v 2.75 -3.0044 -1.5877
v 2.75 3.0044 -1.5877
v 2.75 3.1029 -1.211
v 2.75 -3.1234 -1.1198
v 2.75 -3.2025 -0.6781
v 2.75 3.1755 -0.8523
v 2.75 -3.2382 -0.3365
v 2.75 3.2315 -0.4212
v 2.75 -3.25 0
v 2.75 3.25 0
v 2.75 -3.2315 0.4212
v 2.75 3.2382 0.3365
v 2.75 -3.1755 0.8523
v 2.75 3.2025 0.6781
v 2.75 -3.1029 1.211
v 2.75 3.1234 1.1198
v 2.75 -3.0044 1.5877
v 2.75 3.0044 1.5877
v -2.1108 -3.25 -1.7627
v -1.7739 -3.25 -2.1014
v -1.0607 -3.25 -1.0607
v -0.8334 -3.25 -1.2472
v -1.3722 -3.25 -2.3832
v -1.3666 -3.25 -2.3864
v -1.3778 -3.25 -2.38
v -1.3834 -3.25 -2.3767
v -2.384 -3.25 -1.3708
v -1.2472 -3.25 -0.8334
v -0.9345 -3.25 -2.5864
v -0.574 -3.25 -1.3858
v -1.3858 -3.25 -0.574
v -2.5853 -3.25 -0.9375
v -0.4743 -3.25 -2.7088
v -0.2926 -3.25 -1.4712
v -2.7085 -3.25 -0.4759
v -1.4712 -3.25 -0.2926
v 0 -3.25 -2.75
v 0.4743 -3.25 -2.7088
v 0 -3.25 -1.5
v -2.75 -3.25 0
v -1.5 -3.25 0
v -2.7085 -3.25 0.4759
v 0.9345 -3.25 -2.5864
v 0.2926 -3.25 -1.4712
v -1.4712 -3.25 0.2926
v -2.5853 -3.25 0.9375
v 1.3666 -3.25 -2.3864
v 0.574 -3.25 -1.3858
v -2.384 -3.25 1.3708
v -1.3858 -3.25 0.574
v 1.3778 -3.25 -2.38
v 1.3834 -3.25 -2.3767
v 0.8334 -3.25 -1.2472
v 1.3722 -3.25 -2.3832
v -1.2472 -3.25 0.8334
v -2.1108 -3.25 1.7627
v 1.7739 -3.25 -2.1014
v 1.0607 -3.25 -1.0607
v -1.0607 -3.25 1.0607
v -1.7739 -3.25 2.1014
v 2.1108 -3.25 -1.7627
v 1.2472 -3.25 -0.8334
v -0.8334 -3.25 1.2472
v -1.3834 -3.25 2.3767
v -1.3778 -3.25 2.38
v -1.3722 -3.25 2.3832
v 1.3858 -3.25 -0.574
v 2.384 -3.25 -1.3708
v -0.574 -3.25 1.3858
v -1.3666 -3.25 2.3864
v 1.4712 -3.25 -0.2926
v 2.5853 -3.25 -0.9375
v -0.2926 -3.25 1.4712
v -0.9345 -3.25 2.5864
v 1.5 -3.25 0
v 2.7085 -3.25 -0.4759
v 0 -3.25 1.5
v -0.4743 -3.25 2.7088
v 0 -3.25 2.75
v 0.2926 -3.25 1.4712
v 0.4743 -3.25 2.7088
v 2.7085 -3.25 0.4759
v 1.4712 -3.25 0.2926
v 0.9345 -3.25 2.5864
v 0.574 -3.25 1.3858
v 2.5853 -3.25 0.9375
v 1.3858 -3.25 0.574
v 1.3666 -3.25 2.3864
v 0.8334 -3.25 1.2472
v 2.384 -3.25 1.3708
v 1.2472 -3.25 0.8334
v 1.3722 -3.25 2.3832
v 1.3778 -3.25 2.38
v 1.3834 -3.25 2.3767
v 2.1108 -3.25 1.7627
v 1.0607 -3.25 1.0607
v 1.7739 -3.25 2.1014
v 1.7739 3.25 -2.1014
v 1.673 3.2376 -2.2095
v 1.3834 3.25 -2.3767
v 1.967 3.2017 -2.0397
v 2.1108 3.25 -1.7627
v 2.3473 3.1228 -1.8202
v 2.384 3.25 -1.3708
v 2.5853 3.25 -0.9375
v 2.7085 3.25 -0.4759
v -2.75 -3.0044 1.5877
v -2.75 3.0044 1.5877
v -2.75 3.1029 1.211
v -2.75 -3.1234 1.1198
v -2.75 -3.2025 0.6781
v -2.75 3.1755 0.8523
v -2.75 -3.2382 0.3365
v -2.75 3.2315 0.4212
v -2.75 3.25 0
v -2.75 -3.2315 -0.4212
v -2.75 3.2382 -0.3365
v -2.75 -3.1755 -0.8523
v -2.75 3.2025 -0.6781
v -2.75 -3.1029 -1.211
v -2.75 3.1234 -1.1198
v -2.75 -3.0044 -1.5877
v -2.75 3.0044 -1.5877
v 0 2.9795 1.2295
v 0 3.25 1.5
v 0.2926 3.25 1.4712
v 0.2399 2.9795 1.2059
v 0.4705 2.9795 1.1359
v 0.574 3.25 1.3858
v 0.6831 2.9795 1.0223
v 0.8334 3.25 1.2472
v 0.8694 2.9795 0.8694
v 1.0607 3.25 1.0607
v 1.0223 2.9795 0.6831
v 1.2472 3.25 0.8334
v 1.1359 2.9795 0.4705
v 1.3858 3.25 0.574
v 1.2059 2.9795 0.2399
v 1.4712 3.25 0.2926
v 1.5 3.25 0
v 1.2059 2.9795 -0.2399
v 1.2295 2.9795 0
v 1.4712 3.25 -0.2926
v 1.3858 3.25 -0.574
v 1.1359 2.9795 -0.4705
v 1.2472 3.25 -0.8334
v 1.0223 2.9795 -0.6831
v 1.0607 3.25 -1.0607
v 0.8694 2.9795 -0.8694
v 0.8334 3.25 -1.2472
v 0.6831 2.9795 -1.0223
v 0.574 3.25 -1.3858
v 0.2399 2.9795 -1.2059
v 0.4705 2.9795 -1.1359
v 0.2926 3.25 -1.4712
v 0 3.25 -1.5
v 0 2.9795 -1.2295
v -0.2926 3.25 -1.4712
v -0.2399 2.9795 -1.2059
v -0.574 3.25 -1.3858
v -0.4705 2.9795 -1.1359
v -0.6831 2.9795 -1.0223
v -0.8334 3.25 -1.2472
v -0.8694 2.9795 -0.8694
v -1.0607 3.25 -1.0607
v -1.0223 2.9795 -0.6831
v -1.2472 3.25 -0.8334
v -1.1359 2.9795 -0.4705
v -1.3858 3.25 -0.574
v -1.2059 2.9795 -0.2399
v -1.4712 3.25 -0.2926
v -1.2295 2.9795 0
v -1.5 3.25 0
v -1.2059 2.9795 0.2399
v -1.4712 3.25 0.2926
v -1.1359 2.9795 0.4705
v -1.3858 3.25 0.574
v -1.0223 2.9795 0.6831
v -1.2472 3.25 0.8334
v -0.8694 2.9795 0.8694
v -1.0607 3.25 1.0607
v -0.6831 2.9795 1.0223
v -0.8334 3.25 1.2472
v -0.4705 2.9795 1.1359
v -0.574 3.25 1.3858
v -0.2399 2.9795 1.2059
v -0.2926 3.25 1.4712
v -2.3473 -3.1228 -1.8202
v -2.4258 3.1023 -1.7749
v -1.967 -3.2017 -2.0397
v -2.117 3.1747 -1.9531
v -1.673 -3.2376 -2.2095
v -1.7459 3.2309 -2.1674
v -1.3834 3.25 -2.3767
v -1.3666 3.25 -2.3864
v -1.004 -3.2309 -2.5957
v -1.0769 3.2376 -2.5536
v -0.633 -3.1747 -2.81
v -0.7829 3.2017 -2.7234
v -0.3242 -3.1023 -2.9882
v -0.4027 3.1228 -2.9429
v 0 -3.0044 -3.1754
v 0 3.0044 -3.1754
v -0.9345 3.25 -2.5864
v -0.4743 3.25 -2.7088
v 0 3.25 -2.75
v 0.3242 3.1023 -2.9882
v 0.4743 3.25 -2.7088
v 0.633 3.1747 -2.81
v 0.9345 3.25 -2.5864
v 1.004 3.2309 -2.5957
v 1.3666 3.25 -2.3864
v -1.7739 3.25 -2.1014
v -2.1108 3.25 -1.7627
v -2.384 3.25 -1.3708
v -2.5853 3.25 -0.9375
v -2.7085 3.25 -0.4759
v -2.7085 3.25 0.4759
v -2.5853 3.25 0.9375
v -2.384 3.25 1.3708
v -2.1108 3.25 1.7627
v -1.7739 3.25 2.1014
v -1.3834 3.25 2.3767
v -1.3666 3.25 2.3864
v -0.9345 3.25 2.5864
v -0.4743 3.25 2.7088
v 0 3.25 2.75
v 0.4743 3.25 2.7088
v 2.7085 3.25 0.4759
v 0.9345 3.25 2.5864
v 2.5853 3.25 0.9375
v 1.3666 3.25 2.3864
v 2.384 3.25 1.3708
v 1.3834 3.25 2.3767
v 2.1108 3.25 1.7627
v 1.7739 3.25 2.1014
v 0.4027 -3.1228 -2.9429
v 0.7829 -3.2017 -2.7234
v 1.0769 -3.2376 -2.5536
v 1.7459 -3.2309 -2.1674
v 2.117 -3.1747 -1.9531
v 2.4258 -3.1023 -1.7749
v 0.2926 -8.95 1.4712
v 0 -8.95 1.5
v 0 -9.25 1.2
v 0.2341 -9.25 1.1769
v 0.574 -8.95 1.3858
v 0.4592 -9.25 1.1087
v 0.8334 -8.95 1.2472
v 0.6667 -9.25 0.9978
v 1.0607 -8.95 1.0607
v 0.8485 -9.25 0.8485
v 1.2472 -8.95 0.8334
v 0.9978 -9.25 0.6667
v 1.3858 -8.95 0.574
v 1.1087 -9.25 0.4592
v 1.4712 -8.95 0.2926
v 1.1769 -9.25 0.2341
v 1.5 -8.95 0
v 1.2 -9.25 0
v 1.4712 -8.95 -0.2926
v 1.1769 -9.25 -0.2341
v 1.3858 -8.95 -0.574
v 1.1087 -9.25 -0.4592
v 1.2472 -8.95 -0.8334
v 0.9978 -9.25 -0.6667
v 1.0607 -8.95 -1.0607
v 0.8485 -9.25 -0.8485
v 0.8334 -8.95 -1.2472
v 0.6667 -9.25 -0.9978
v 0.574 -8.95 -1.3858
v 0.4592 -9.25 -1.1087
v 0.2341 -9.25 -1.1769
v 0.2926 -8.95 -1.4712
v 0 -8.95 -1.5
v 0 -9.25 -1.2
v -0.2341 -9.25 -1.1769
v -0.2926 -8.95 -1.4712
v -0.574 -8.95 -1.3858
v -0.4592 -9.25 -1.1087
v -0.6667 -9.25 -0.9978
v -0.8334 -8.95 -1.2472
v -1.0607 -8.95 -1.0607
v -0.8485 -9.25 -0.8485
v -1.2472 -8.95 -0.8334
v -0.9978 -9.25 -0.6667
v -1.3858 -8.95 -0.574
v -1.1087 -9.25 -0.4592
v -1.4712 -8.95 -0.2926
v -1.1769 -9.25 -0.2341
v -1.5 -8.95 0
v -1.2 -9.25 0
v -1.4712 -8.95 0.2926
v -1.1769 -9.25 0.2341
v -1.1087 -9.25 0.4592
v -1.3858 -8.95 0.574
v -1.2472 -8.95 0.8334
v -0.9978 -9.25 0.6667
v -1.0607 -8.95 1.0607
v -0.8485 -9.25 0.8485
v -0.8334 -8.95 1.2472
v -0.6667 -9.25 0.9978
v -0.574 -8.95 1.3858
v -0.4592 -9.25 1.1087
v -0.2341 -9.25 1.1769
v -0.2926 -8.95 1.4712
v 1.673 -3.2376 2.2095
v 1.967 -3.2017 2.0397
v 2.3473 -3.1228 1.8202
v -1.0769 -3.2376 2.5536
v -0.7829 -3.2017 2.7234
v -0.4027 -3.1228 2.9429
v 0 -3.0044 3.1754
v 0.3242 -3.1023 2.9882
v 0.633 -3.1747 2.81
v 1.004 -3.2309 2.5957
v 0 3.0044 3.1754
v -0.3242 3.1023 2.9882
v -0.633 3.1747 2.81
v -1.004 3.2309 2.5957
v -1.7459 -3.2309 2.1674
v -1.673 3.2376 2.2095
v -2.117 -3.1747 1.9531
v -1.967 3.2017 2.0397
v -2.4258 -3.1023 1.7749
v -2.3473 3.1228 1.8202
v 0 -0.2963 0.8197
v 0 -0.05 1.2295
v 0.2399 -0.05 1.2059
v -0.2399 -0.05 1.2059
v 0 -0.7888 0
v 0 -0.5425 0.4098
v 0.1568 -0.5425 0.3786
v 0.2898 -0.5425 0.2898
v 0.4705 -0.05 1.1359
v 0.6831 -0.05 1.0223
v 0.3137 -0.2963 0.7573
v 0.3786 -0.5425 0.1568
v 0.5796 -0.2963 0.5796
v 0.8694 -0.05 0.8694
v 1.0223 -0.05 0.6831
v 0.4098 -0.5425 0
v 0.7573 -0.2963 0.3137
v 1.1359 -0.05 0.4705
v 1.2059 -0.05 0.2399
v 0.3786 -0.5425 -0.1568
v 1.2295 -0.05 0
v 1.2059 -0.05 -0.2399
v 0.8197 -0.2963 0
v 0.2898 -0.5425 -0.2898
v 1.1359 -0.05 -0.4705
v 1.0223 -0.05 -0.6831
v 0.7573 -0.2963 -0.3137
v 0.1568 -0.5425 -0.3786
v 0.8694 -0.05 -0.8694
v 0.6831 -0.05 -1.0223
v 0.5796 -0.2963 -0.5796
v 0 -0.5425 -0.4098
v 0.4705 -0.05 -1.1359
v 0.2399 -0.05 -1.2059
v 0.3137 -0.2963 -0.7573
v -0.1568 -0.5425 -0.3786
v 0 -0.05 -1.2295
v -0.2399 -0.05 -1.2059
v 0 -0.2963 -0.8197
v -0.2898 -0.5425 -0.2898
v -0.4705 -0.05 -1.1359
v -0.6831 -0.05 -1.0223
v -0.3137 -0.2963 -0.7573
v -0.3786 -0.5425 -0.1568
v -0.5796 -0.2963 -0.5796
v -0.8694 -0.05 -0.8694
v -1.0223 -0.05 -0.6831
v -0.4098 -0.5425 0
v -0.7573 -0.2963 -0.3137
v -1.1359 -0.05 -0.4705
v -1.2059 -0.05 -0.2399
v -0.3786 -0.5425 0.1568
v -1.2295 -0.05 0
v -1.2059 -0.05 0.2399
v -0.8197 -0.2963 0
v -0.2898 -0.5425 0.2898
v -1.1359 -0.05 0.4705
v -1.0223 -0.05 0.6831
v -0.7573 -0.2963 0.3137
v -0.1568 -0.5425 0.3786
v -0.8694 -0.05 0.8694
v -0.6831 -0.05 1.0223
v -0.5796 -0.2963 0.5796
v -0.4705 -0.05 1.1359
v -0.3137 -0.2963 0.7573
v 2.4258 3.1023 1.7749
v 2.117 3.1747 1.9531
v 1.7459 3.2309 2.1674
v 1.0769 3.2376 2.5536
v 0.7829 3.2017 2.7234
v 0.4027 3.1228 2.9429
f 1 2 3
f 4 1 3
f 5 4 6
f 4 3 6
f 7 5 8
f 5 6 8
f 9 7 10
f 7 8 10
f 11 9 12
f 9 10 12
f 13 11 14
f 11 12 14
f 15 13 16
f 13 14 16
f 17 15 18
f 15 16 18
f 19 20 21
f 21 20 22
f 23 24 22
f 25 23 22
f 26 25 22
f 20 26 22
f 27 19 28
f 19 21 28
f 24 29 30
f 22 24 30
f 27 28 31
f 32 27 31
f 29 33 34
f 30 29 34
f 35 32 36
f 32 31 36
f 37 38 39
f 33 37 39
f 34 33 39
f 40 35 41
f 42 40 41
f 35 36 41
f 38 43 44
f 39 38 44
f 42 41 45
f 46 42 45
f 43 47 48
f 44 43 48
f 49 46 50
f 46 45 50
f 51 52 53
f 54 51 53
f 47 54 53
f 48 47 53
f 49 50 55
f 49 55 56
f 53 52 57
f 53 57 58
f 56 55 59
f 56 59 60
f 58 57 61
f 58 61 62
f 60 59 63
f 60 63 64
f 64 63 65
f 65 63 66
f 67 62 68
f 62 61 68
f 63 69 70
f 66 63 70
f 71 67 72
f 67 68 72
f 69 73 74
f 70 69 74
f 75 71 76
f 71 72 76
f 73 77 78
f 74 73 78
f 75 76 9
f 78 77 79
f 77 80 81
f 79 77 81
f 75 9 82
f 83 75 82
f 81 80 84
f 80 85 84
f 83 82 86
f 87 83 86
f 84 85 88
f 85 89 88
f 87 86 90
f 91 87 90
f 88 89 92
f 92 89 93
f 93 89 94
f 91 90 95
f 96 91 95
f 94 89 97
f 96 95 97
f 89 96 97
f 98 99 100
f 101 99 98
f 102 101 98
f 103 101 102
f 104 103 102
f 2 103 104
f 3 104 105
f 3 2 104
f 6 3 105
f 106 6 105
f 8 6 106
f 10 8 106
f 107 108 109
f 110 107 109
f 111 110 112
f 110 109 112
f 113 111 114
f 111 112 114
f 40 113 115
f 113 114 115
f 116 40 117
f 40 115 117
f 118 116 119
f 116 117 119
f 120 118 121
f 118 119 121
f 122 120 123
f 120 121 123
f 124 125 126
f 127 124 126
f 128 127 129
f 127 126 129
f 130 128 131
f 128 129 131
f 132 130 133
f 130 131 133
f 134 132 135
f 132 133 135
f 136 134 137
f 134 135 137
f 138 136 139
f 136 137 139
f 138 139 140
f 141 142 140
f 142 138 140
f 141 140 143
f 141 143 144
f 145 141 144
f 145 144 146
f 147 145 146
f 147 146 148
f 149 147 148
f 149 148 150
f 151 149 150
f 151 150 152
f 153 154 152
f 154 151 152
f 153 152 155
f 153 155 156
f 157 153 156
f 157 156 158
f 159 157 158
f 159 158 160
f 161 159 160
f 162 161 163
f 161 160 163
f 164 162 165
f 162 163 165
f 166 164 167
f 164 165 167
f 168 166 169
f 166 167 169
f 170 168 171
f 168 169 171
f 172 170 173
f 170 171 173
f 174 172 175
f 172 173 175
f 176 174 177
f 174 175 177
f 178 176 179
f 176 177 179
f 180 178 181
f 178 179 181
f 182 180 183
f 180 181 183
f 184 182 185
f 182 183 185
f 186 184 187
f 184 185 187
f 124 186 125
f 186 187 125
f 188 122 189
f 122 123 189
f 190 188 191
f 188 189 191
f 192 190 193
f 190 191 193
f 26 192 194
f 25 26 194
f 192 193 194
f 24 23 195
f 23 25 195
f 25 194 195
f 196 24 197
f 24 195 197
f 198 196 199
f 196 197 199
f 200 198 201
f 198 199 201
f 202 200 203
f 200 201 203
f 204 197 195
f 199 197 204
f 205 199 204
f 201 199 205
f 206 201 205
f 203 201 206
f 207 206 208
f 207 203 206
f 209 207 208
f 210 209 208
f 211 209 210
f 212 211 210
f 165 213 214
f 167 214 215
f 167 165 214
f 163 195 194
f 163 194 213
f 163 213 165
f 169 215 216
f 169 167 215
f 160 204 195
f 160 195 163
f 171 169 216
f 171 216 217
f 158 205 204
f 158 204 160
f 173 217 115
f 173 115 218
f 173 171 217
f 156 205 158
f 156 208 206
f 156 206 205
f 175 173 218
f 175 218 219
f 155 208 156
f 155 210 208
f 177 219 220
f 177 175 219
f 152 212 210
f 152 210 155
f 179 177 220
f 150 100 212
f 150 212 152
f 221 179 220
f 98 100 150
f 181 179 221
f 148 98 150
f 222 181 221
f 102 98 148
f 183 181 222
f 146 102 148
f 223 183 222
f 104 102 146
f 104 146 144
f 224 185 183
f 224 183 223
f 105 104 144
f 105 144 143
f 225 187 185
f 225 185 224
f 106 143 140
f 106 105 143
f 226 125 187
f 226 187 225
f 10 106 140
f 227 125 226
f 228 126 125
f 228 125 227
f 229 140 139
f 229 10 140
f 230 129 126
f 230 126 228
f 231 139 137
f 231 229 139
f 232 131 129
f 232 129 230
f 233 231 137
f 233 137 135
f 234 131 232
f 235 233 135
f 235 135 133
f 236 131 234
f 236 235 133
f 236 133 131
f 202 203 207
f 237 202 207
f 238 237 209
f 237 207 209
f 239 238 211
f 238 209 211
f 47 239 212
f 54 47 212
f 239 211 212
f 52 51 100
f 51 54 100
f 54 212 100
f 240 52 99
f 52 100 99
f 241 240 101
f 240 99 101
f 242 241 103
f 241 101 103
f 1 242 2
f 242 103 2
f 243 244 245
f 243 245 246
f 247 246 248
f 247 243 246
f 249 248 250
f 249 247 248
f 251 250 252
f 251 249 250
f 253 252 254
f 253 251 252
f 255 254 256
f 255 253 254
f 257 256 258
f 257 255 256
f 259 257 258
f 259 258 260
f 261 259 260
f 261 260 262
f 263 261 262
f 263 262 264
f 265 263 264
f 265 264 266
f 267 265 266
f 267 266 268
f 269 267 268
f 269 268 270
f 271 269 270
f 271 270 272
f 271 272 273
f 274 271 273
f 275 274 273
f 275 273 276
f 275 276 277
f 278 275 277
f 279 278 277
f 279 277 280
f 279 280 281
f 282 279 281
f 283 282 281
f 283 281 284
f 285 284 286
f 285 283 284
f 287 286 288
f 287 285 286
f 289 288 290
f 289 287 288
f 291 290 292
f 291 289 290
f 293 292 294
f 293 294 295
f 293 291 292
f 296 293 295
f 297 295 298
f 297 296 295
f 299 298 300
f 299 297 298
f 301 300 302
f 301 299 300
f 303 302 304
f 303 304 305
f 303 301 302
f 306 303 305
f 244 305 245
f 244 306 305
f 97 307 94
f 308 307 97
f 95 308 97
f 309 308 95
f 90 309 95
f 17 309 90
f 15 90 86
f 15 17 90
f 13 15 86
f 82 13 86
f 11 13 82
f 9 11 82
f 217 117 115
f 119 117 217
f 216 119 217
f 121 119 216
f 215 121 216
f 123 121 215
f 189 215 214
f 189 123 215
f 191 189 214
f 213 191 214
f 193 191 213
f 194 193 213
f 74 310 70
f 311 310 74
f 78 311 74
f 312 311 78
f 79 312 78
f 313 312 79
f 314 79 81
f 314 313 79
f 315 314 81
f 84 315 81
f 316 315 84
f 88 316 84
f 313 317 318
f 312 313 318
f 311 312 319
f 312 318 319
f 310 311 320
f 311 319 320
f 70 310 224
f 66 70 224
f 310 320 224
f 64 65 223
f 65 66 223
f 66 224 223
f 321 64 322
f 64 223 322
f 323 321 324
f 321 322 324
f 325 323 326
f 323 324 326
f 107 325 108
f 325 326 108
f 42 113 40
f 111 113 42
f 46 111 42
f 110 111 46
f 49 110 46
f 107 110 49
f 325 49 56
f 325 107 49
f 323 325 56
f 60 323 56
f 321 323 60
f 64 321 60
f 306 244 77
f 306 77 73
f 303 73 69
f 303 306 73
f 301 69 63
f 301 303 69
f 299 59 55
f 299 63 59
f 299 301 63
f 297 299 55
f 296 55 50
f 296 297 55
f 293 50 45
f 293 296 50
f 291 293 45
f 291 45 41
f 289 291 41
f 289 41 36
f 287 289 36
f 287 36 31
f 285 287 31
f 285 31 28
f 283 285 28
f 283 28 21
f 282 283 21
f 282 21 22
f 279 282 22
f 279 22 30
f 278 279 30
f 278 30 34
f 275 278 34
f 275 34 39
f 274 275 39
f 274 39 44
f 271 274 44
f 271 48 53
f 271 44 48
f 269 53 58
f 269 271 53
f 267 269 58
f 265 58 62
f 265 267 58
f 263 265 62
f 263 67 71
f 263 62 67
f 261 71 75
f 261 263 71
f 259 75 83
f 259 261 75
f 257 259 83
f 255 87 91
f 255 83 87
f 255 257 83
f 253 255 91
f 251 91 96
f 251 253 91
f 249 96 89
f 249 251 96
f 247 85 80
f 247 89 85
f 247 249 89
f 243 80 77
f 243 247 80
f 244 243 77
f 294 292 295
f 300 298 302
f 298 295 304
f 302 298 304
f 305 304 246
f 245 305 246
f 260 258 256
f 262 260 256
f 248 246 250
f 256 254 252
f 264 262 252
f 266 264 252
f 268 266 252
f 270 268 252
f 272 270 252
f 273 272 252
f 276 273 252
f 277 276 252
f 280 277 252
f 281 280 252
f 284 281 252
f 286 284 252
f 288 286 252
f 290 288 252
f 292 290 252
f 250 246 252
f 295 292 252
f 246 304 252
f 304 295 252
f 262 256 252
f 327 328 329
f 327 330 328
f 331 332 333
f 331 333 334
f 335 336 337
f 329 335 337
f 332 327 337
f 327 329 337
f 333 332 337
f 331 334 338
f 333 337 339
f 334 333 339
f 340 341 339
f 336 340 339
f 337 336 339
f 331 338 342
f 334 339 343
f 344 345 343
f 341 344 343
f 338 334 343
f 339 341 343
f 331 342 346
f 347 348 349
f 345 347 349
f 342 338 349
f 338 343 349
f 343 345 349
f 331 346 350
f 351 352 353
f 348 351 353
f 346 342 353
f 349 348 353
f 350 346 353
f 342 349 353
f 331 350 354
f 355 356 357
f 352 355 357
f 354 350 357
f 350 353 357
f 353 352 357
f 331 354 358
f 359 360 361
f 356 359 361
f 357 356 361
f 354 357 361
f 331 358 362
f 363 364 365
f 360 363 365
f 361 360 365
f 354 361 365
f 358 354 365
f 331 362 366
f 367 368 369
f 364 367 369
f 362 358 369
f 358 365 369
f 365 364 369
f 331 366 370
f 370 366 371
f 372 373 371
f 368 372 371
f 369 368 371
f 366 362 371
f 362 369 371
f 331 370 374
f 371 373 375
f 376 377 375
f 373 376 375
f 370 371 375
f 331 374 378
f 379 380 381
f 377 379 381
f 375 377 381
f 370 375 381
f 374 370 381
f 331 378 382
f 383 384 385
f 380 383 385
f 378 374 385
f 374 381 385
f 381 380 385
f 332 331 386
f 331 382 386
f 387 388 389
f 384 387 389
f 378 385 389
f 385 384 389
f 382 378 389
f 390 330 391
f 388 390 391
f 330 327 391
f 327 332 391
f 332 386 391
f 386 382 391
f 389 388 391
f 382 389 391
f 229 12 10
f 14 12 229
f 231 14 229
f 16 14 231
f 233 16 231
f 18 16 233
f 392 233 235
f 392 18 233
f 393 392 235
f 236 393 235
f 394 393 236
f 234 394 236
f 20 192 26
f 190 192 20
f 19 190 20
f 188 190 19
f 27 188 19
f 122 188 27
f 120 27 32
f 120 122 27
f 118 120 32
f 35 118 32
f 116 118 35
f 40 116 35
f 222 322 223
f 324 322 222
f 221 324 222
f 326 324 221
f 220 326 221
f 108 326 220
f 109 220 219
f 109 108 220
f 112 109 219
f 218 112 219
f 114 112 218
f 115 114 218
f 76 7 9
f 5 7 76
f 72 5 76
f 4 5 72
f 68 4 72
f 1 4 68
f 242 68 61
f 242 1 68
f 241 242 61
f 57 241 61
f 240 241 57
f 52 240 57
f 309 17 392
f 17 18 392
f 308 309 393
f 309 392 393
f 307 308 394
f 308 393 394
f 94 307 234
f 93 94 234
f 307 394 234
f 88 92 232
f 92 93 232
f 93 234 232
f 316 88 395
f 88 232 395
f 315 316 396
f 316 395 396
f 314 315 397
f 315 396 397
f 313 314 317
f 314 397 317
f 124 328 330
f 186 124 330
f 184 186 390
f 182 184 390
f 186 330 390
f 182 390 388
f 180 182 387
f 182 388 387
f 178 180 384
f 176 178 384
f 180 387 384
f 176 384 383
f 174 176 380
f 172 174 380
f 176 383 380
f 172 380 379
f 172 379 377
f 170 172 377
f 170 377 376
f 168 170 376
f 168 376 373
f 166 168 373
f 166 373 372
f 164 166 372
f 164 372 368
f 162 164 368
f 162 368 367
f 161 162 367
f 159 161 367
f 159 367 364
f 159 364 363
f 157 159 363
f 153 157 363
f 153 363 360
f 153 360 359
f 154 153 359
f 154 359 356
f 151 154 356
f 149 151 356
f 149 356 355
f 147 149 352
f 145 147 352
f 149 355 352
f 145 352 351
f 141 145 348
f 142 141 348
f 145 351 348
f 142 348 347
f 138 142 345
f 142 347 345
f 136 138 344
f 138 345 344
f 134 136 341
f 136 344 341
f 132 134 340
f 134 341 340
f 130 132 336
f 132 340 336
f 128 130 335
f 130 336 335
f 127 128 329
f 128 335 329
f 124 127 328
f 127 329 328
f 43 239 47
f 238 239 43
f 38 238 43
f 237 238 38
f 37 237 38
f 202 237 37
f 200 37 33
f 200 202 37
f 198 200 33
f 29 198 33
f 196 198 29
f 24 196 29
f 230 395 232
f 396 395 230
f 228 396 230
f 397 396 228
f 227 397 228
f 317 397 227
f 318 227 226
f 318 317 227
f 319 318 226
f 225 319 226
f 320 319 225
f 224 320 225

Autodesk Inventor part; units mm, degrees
ref_plane "YZ Plane" through (0, 0, 0) normal (1, 0, 0) x (0, 1, 0)
ref_plane "XZ Plane" through (0, 0, 0) normal (0, 1, 0) x (-1, 0, 0)
ref_plane "XY Plane" through (0, 0, 0) normal (0, 0, 1) x (1, 0, 0)
sketch "スケッチ1" plane through (0, 0, 0) normal (1, 0, 0) x (0, 1, 0)
  line L0 (-3.25, 0) -> (3.25, 0)
  line L1 (0, 0) -> (0, 3.1754) construction
  line L2 (-3.0044, 3.1754) -> (-3.25, 2.75)
  line L3 (-3.25, 2.75) -> (-3.25, 0)
  line L4 (-3.0044, 3.1754) -> (3.0044, 3.1754)
  line L5 (3.0044, 3.1754) -> (3.25, 2.75)
  line L6 (3.25, 2.75) -> (3.25, 0)
  line L7 (-3.25, 1.5) -> (-8.95, 1.5)
  line L8 (-9.25, 1.2) -> (-9.25, 0)
  line L9 (-9.25, 0) -> (-3.25, 0)
  line L10 (-8.95, 1.5) -> (-9.25, 1.2)
  point P0 (3.25, 1.5)
  point P1 (-9.25, 1.5)
  dimension "d1" = 2.75
  dimension "d2" = 3.1754
  dimension "d3" = 30
  dimension "d4" = 6.5
  dimension "d18" = 6
  dimension "d19" = 3
  dimension "d22" = 0.3
  dimension "d23" = 0.3
revolve "回転1" add sketch "スケッチ1" angle 360 about axis through (0, -3.25, 0) along (0, 1, 0)
sketch "スケッチ2" plane through (0, 3.25, 0) normal (0, 1, 0) x (1, 0, 0)
  line L0 (0, -3.1754) -> (-2.75, -1.5877)
  line L1 (-2.75, -1.5877) -> (-2.75, 1.5877)
  line L2 (-2.75, 1.5877) -> (0, 3.1754)
  line L3 (0, 3.1754) -> (2.75, 1.5877)
  line L4 (2.75, 1.5877) -> (2.75, -1.5877)
  line L5 (2.75, -1.5877) -> (0, -3.1754)
  circle A0 centre (0, 0) radius 3.1754 projected
  point P0 (0, 0)
  point P1 (0, 0)
  point P2 (0, 0)
  point P3 (0, 0)
  point P4 (0, 3.1754)
  point P5 (0, 3.1754)
  point P6 (2.75, -1.5877)
  point P7 (2.75, -1.5877)
extrude "押し出し1" cut sketch "スケッチ2" against normal through all contours A0 L0 | L5 A0 | A0 L1 | L4 A0 | A0 L2 | L3 A0
hole "穴1" at (0, 3.25, 0) direction (0, -1, 0) diameter 2.459 depth 3.3 tip angle 118 countersink diameter 3 countersink angle 90 thread size "M3x0.5" class "6H" standard "ISO Metric profile"
thread "ねじ1" size "M3x0.5" class "6g" standard "ANSI Metric M Profile" full length
equation "\"d2\" = 1.1547 * d1"
equation "\"d23\" = d22"
properties part number "BSL-306.5BE" material "アセタール樹脂、黒"
